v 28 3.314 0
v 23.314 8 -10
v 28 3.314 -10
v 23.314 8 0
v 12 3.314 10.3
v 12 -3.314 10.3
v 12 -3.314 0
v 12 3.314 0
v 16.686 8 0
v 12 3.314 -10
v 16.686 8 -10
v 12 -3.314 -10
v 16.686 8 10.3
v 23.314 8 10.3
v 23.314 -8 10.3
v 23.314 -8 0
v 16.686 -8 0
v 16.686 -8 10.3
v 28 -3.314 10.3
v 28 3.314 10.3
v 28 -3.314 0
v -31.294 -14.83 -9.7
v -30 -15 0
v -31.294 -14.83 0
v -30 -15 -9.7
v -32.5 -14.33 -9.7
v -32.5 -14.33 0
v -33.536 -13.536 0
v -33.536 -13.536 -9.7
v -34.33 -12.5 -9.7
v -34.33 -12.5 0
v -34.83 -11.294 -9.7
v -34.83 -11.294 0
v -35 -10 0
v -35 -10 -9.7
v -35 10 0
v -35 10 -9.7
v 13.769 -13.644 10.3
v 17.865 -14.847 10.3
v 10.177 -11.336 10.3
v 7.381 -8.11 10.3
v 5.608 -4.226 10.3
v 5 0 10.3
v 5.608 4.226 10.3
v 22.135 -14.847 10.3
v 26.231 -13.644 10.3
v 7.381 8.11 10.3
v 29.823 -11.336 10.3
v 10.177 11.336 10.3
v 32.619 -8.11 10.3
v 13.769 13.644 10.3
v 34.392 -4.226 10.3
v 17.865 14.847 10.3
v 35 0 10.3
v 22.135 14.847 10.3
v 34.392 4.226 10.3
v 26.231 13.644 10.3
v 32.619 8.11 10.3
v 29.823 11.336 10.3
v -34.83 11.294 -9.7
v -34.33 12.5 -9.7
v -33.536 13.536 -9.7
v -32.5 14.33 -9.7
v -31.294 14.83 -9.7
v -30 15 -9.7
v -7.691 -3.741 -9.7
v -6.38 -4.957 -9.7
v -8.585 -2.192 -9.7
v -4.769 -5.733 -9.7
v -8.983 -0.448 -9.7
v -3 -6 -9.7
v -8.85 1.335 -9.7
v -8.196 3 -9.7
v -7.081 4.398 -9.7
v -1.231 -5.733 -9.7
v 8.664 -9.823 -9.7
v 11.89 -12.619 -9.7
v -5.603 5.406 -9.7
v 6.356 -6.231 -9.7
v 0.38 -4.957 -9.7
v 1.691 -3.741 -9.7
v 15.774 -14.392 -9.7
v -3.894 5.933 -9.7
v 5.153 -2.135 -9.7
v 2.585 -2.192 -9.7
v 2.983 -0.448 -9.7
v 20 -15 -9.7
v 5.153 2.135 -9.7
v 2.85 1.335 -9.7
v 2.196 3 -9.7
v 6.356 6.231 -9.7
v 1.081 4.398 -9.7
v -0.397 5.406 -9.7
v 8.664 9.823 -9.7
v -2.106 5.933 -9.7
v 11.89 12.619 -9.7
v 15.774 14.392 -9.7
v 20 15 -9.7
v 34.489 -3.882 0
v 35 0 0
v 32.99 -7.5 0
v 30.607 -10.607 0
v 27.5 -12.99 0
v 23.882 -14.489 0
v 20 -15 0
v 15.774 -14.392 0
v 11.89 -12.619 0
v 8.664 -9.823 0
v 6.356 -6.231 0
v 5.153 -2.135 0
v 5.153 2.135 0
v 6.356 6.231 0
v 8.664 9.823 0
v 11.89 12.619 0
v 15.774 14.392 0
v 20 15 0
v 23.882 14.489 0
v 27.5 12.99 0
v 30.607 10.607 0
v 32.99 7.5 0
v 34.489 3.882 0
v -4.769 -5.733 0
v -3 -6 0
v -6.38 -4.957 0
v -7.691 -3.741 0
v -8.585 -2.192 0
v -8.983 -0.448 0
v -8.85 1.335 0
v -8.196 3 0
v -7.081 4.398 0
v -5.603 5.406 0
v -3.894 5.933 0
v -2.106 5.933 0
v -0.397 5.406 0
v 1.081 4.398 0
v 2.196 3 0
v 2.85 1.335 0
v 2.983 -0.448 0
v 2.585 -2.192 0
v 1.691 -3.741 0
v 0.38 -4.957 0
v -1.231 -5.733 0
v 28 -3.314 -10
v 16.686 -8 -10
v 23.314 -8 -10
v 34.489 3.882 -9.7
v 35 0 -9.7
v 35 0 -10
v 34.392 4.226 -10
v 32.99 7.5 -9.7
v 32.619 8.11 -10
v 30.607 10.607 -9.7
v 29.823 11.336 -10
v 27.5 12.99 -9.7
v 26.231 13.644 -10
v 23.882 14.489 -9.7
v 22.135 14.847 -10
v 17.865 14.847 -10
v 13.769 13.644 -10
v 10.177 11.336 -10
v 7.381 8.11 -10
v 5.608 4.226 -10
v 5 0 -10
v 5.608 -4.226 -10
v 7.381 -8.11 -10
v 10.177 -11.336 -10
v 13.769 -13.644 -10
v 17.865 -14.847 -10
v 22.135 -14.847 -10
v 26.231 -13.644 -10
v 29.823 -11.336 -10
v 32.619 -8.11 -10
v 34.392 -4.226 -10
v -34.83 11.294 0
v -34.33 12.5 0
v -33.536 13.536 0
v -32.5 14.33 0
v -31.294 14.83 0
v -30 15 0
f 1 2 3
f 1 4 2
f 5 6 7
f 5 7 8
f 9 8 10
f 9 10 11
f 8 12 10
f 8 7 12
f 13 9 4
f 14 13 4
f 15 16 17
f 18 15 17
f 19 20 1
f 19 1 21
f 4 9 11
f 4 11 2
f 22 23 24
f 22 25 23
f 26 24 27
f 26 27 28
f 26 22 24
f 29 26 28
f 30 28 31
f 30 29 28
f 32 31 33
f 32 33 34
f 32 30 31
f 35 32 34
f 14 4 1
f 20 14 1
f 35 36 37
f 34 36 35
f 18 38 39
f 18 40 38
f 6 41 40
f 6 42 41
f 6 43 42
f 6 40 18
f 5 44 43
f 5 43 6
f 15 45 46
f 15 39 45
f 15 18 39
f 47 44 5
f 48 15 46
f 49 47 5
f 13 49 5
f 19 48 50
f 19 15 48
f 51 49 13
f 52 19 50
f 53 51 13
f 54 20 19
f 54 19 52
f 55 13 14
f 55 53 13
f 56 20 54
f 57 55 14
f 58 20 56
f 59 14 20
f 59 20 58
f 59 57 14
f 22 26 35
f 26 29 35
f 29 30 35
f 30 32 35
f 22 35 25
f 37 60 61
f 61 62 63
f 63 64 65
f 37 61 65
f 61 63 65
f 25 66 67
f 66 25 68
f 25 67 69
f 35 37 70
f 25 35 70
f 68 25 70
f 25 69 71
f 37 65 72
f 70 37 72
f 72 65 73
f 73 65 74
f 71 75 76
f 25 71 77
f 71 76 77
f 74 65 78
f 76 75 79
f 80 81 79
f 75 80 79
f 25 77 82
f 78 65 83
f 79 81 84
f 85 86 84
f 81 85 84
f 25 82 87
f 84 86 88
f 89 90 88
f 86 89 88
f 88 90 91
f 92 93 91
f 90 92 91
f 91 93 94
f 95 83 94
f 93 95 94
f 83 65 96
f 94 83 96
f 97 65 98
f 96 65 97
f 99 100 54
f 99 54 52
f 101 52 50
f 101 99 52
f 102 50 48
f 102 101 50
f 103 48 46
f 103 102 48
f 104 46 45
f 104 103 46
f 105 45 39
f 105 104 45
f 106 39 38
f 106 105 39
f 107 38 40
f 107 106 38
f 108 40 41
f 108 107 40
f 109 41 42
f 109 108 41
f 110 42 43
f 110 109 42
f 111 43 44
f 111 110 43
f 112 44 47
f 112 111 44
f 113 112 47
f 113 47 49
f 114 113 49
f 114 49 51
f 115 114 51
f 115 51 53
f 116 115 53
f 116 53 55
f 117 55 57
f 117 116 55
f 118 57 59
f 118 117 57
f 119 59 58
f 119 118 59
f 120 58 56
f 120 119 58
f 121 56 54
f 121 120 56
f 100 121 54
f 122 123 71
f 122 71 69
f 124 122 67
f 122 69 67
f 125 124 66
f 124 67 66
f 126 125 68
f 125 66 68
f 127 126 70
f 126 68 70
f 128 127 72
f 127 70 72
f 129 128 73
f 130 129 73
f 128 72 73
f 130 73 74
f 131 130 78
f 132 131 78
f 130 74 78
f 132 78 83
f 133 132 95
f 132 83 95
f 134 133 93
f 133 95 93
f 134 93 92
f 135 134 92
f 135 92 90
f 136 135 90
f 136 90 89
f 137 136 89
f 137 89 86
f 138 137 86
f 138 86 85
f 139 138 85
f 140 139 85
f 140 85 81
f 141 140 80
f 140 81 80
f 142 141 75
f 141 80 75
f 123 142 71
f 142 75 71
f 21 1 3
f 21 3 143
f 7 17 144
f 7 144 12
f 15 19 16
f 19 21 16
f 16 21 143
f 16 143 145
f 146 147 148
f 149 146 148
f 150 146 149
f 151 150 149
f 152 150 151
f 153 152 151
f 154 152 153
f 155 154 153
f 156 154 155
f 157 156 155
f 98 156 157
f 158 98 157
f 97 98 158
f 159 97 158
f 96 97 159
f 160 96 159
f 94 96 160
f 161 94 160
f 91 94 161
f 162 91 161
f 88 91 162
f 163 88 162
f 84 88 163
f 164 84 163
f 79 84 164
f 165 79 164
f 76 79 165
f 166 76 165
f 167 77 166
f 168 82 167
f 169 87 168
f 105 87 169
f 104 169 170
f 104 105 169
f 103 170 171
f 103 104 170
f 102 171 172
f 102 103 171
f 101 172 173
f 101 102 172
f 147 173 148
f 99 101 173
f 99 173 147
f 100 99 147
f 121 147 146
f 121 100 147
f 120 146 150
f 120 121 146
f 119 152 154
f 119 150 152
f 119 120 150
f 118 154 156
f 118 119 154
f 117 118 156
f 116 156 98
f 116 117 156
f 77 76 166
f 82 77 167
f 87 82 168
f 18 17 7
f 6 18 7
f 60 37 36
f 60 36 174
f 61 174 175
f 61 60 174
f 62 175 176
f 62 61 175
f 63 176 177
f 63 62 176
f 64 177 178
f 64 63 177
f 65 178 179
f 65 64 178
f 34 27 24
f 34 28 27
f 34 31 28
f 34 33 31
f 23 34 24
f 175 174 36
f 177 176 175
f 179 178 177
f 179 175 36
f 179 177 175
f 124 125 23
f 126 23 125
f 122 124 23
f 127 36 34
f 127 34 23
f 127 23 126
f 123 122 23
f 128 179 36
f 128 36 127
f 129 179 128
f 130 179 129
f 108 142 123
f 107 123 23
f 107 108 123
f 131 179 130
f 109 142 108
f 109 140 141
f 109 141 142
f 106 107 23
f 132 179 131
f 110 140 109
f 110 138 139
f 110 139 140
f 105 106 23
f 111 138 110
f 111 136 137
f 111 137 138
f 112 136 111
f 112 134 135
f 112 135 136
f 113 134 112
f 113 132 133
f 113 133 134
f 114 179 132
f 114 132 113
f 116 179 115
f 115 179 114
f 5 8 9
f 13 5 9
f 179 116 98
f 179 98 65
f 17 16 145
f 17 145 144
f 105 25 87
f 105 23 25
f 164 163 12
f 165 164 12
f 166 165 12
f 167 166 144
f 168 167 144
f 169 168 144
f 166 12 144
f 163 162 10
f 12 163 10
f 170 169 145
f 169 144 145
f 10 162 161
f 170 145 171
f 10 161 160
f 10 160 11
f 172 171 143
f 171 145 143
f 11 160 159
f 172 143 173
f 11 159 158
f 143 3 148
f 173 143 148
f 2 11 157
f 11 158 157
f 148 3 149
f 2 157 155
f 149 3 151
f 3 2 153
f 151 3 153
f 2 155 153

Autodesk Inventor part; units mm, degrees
ref_plane "YZ Plane" through (0, 0, 0) normal (1, 0, 0) x (0, 1, 0)
ref_plane "XZ Plane" through (0, 0, 0) normal (0, 1, 0) x (-1, 0, 0)
ref_plane "XY Plane" through (0, 0, 0) normal (0, 0, 1) x (1, 0, 0)
sketch "Skizze1" plane through (0, 0, 0) normal (0, 0, 1) x (1, 0, 0)
  line L0 (0, -21) -> (0, 21) projected
  line L1 (-35, -15) -> (20, -15)
  line L2 (20, 15) -> (-35, 15)
  line L3 (-35, 15) -> (-35, -15)
  line L4 (20, 15) -> (9.0192, 15)
  line L5 (9.0192, -15) -> (20, -15)
  circle A0 centre (20, 0) radius 15
  line L6 (23.3137, 8) -> (28, 3.3137)
  line L7 (28, 3.3137) -> (28, -3.3137)
  line L8 (28, -3.3137) -> (23.3137, -8)
  line L9 (23.3137, -8) -> (16.6863, -8)
  line L10 (16.6863, -8) -> (12, -3.3137)
  line L11 (12, -3.3137) -> (12, 3.3137)
  line L12 (12, 3.3137) -> (16.6863, 8)
  line L13 (16.6863, 8) -> (23.3137, 8)
  line L14 (-49, 0) -> (49, 0) projected
  point P0 (0, 0)
  point P1 (20, -15)
  point P2 (20, 15)
  point P3 (-3, 0)
  dimension "d18" = 16
extrude "Extrusion1" add sketch "Skizze1" against normal blind 9.7
extrude "Extrusion2" add sketch "Skizze1" against normal blind 10 contours L14 L11 L10 L9 L8 L7 A0 | A0 L14 L7 L6 L13 L12 L11 | L14 L7 L8 L9 L10 L11 | L11 L12 L13 L6 L7 L14
fillet "Rundung1" radius 5 2 edges at (-35, -15, -4.85) (-35, 15, -4.85)
hole "Bohrung1" at (-3, 0, 0) direction (0, 0, -1) diameter 12 end through all
extrude "Extrusion3" add sketch "Skizze1" along normal blind 10.3 contours L14 L11 L10 L9 L8 L7 A0 | A0 L14 L7 L6 L13 L12 L11 | L14 L7 L8 L9 L10 L11 | L11 L12 L13 L6 L7 L14
extrude "Extrusion4" cut sketch "Skizze1" along normal blind 10.3 contours L14 L7 L8 L9 L10 L11 | L11 L12 L13 L6 L7 L14
extrude "Extrusion5" cut sketch "Skizze1" against normal blind 10 contours L14 L7 L8 L9 L10 L11 | L11 L12 L13 L6 L7 L14
properties material "1.0038 S235JR"
